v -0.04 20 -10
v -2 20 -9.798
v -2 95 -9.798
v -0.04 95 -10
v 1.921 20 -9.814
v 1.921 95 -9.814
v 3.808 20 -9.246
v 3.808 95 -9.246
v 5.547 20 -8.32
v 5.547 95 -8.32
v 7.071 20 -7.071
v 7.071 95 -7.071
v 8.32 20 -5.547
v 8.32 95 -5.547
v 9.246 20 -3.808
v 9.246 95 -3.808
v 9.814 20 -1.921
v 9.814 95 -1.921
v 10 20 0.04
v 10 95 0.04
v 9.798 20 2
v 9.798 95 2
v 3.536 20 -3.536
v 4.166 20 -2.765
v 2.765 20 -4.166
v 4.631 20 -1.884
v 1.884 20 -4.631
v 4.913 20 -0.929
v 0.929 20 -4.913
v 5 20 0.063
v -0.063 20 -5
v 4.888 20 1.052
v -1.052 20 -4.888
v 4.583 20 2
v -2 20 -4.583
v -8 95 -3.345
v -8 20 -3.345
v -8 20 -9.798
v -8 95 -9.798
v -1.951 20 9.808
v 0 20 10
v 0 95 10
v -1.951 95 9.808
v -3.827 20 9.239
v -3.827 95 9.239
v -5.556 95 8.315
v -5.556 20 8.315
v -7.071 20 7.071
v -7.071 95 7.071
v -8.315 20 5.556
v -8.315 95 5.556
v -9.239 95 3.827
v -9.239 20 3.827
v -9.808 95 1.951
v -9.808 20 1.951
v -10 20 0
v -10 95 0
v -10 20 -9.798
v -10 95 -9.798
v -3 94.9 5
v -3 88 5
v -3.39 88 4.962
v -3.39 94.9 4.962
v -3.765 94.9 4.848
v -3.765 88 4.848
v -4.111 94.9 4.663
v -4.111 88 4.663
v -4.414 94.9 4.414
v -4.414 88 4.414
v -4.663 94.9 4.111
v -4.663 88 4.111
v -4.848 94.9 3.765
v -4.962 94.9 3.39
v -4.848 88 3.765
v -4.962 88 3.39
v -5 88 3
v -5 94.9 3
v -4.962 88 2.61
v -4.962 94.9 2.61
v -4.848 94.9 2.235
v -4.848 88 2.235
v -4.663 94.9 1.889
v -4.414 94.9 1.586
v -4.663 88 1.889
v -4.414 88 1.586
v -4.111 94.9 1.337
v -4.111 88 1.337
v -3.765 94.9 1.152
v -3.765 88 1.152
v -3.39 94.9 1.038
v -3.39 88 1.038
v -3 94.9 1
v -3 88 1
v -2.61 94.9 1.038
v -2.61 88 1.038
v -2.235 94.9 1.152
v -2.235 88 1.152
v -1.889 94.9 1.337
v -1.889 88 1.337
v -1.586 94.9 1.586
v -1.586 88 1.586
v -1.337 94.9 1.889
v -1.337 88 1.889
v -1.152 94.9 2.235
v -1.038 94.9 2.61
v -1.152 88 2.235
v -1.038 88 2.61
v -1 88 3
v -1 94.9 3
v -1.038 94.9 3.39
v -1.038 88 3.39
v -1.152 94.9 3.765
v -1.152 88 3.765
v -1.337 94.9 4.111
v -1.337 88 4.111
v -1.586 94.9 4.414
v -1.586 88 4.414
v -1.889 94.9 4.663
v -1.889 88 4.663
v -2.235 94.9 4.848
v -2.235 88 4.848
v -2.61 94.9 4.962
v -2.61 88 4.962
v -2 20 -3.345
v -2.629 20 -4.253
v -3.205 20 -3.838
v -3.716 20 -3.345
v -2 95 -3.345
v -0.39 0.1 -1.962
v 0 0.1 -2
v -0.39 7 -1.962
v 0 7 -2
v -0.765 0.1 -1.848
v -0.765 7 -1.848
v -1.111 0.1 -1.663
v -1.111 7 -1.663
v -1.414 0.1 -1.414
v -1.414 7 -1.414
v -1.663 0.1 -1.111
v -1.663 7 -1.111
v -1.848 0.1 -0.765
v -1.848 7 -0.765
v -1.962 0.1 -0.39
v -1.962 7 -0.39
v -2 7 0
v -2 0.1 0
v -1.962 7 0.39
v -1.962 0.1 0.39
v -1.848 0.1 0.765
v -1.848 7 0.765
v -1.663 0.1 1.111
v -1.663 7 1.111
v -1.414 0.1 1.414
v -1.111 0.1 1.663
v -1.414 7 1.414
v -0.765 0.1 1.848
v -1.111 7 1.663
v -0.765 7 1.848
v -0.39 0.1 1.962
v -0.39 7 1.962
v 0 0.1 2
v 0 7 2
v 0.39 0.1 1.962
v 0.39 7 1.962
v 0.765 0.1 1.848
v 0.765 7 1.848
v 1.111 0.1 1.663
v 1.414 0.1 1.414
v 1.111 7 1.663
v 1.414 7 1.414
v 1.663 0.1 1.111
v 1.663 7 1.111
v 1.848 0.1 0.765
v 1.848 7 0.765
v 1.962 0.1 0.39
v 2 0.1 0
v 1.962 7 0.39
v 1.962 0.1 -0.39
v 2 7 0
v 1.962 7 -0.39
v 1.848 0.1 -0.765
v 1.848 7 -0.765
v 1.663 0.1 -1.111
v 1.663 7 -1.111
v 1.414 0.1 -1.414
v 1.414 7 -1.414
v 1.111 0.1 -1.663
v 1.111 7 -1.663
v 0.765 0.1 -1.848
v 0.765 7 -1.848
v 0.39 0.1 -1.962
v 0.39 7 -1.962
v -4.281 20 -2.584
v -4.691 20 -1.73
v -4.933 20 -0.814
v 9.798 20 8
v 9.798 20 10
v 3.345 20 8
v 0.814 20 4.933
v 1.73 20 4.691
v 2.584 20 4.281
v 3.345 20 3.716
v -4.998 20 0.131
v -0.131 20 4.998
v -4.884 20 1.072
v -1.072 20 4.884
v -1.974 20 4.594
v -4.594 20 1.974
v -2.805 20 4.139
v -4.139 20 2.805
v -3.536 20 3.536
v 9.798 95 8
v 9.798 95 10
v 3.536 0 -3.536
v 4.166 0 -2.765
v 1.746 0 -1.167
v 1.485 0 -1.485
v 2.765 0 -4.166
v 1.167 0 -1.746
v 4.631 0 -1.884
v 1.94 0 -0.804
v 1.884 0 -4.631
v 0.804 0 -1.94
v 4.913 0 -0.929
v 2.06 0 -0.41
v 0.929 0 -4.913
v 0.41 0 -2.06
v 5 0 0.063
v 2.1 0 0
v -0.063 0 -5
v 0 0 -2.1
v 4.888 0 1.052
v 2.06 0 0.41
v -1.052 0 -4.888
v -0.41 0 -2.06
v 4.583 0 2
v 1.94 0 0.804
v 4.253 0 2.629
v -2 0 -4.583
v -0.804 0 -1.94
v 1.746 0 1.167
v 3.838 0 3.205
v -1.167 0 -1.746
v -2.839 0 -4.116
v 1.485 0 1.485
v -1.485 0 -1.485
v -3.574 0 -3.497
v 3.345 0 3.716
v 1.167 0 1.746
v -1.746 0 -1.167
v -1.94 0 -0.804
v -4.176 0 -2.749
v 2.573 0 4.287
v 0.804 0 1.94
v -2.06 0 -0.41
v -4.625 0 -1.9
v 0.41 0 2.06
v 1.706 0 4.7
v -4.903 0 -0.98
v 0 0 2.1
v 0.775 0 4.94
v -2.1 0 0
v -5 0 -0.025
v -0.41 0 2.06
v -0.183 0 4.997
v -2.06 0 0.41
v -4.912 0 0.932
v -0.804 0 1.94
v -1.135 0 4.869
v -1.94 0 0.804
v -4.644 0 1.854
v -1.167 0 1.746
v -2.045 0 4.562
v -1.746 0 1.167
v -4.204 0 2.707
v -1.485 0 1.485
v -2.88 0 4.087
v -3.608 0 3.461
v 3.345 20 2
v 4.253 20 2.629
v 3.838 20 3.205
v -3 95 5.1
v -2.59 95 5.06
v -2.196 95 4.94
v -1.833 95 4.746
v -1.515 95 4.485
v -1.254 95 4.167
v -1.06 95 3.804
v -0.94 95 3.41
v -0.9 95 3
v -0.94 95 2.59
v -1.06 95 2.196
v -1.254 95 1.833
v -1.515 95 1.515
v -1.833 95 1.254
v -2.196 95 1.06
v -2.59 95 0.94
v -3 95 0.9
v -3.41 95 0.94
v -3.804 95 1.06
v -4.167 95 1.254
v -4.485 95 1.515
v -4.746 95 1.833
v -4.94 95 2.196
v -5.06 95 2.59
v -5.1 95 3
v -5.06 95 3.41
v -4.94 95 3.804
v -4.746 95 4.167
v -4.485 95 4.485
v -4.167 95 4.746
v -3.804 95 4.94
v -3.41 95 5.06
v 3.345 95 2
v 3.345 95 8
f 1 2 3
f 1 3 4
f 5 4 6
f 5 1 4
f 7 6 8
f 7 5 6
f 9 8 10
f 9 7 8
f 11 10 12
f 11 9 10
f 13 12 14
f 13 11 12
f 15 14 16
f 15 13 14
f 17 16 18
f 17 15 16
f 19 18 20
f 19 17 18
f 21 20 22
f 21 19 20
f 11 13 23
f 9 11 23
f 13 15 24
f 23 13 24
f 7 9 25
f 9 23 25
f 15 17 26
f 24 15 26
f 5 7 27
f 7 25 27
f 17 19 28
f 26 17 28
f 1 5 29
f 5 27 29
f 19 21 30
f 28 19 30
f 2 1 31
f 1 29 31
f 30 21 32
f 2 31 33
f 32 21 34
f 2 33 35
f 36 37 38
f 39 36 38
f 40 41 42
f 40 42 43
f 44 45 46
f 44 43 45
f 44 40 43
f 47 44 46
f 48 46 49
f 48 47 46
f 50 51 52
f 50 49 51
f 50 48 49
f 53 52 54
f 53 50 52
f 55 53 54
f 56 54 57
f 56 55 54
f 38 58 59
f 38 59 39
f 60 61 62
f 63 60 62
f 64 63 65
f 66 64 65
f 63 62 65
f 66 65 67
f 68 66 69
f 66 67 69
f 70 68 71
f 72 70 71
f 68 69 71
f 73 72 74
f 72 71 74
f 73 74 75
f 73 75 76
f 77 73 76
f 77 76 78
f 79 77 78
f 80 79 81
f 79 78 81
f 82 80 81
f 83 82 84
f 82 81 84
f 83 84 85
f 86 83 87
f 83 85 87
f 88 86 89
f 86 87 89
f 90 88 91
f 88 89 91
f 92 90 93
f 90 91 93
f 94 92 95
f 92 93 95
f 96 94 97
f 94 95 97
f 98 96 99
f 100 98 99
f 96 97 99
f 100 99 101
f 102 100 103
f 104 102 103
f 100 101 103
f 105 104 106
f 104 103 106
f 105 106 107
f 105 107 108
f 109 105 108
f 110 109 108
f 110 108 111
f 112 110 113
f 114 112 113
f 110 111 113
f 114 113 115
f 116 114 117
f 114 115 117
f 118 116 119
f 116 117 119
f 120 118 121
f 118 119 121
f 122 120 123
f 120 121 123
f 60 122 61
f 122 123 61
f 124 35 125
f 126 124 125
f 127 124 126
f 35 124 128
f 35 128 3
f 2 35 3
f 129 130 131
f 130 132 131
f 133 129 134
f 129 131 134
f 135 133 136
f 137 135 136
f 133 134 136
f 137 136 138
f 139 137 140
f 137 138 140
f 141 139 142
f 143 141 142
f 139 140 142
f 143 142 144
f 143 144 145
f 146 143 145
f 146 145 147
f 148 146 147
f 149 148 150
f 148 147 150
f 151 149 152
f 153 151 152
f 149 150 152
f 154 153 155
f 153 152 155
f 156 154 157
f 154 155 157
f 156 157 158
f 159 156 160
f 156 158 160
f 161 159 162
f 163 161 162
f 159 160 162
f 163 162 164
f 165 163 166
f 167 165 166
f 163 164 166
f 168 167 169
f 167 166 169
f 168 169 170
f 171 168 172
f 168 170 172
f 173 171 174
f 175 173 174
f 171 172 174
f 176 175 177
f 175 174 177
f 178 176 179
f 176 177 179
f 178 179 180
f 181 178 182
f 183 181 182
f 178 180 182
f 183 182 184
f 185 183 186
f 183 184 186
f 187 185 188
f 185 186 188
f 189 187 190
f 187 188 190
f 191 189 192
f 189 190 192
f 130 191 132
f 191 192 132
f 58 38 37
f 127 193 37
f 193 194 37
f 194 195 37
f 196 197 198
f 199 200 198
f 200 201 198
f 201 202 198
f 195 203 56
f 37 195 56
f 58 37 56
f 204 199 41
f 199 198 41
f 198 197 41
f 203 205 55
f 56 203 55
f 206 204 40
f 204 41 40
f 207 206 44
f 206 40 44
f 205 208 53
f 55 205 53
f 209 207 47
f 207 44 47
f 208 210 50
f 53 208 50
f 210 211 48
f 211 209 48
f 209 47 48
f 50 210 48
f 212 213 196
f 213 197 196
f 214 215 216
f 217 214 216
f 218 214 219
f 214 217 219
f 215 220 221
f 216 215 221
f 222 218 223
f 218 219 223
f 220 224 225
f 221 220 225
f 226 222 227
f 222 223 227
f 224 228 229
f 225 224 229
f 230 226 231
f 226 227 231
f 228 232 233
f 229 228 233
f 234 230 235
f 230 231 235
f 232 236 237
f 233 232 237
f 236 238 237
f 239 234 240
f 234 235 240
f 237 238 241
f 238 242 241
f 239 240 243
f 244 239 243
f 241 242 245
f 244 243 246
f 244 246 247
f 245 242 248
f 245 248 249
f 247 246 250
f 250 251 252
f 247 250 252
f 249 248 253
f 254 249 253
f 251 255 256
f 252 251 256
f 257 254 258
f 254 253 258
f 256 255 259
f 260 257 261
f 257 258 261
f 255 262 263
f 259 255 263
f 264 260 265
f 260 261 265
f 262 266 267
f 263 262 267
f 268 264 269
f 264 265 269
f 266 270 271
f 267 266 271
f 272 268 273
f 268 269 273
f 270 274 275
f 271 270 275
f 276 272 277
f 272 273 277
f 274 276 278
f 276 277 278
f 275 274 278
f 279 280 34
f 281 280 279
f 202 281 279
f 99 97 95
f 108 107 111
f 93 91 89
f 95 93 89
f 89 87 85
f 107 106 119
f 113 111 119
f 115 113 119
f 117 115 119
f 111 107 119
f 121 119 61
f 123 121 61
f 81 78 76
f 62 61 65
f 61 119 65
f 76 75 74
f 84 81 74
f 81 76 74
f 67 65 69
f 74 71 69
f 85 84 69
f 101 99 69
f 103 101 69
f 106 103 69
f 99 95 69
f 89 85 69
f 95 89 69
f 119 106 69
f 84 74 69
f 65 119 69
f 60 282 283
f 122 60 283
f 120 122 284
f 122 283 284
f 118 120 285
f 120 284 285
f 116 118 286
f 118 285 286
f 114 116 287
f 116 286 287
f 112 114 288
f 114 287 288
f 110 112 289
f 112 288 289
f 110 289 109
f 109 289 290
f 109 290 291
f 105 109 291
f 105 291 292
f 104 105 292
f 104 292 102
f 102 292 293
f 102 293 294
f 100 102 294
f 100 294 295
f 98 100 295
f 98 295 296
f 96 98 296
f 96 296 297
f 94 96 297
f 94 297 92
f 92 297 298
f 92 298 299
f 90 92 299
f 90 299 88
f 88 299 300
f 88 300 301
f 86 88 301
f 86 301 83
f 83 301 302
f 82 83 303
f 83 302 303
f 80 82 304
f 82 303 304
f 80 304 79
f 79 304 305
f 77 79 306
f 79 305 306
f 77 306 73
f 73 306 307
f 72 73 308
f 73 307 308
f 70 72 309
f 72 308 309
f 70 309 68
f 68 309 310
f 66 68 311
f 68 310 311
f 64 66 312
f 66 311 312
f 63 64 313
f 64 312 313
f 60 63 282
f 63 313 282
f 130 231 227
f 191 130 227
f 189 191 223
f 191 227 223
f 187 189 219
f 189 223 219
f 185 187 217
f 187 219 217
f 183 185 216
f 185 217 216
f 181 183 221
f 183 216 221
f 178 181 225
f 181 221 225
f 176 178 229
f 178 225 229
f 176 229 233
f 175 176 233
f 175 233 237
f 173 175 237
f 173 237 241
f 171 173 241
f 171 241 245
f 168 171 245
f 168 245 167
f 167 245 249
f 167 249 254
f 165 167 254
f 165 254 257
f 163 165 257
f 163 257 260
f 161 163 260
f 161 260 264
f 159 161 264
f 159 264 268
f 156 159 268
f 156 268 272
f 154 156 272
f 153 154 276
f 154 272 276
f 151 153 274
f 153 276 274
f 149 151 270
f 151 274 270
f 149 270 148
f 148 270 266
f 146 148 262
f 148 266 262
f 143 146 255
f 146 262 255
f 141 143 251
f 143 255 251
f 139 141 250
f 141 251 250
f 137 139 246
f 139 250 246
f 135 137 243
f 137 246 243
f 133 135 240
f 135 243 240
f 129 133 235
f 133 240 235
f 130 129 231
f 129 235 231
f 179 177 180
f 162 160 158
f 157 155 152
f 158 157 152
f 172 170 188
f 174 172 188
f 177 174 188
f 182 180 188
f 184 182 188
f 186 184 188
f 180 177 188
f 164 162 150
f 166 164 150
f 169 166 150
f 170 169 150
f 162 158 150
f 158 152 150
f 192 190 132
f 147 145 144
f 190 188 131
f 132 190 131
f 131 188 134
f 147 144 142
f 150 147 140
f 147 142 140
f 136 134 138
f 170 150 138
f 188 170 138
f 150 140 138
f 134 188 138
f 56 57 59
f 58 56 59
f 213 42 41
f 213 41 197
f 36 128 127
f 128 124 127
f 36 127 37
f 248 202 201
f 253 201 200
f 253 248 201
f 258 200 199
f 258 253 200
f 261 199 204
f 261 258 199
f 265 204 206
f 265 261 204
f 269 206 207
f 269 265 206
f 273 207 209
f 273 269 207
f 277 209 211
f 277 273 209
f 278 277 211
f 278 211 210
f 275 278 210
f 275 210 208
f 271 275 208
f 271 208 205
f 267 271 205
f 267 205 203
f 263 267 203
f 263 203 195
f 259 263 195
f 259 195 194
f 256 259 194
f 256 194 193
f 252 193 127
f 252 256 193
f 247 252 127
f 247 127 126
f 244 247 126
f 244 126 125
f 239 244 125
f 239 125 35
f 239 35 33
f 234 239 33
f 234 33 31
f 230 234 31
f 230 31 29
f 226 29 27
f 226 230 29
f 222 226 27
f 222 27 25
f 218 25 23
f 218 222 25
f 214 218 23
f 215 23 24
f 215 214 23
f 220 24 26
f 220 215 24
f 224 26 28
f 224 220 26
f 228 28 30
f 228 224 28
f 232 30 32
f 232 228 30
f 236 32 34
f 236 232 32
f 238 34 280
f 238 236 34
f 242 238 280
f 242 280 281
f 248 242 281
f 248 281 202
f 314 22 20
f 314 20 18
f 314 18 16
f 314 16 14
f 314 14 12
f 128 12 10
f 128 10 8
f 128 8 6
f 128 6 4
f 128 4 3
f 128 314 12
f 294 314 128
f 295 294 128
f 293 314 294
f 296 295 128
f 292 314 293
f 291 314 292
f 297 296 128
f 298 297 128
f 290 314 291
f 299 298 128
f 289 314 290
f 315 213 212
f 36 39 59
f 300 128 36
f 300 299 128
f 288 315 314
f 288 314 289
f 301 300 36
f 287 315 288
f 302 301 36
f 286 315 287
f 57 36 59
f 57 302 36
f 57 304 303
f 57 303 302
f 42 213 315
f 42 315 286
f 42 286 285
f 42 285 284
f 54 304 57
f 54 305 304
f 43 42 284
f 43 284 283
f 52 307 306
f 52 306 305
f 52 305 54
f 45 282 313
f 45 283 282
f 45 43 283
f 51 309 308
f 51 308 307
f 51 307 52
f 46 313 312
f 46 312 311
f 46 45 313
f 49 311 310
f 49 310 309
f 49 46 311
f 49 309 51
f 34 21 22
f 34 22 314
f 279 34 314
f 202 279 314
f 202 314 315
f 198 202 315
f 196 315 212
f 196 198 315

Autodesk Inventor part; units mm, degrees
ref_plane "YZ Plane" through (0, 0, 0) normal (1, 0, 0) x (0, 1, 0)
ref_plane "XZ Plane" through (0, 0, 0) normal (0, 1, 0) x (-1, 0, 0)
ref_plane "XY Plane" through (0, 0, 0) normal (0, 0, 1) x (1, 0, 0)
sketch "Sketch1" plane through (0, 0, 0) normal (0, 1, 0) x (-1, 0, 0)
  circle A0 centre (0, 0) radius 10
  circle A1 centre (0, 0) radius 5
  line L0 (8, 0) -> (8, -6)
  line L1 (2, -4.5826) -> (2, -9.798)
  line L2 (10, 0) -> (5, 0)
  line L3 (7.0711, 7.0711) -> (-7.0711, -7.0711) construction
  line L4 (0, 8) -> (-6, 8)
  line L5 (-4.5826, 2) -> (-9.798, 2)
  line L6 (0, 10) -> (0, 5)
  line L7 (10, 0) -> (10, -9.798)
  line L8 (10, -9.798) -> (2, -9.798)
  line L9 (0, 10) -> (-9.798, 10)
  line L10 (-9.798, 10) -> (-9.798, 2)
  line L11 (-4.5826, 2) -> (0, 2)
  line L12 (0, 2) -> (0, 5)
  line L13 (5, 0) -> (2, 0)
  line L14 (2, 0) -> (2, -4.5826)
  line L15 (-6, 8) -> (-9.798, 8)
  line L16 (8, -6) -> (8, -9.798)
  line L17 (-3.345, 2) -> (-3.345, 9.4239)
  line L18 (2, -3.345) -> (9.4239, -3.345)
  point P0 (-9.798, 2)
  point P1 (8, -3.345)
  point P2 (-3.345, 8)
  point P3 (-9.798, 2)
  dimension "d0" = 20
  dimension "d1" = 10
  dimension "d10" = 6
  dimension "d11" = 2
  dimension "d12" = 45
  dimension "d15" = 3.3451
extrude "Extrusion1" add sketch "Sketch1" along normal blind 95 contours L2 A1 L6 A0 | L7 L8 L16 A0 | A0 L18 L0 L2 | L6 L4 L17 A0 | A0 L15 L10 L9 | A0 L0 L18 | L0 L18 A1 L2 | L17 L4 A0 | L6 A1 L17 L4 | L13 L14 A1 L11 L12 | A1 L18 L14 L13 | L12 L11 L17 A1 | A0 L5 A1 L1
extrude "Extrusion2" cut sketch "Sketch1" along normal blind 20 contours L2 A1 L6 A0 | L7 L8 L16 A0 | A0 L18 L0 L2 | L6 L4 L17 A0 | A0 L15 L10 L9 | A0 L0 L18 | L0 L18 A1 L2 | L17 L4 A0 | L6 A1 L17 L4 | A0 L1 A1 L18 L0 | L4 L17 A1 L5 A0 | A0 L10 L15 | A0 L5 A1 L1
extrude "Extrusion3" add sketch "Sketch1" along normal blind 20 contours A1 L18 L14 L13 | L12 L11 L17 A1 | A1 L14 L18 | L17 L11 A1
sketch "Sketch2" plane through (0, 95, 0) normal (0, 1, 0) x (1, 0, 0)
  line L0 (-10, 9.798) -> (-10, 0) projected
  line L1 (0, -10) -> (9.798, -10) projected
  point P0 (0, 0)
  point P1 (-3, -3)
  dimension "d16" = 7
  dimension "d24" = 7
hole "Hole1" at (-3, 95, 3) direction (0, -1, 0) diameter 4 depth 7 countersink diameter 4.2 countersink angle 90
sketch "Sketch3" plane through (0, 0, 0) normal (0, -1, 0) x (1, 0, 0)
  circle A0 centre (0, 0) radius 5 projected
hole "Hole2" at (0, 0, 0) direction (0, 1, 0) diameter 4 depth 7 countersink diameter 4.2 countersink angle 90
properties part number "filar(5)" material "ABS Plastic"
